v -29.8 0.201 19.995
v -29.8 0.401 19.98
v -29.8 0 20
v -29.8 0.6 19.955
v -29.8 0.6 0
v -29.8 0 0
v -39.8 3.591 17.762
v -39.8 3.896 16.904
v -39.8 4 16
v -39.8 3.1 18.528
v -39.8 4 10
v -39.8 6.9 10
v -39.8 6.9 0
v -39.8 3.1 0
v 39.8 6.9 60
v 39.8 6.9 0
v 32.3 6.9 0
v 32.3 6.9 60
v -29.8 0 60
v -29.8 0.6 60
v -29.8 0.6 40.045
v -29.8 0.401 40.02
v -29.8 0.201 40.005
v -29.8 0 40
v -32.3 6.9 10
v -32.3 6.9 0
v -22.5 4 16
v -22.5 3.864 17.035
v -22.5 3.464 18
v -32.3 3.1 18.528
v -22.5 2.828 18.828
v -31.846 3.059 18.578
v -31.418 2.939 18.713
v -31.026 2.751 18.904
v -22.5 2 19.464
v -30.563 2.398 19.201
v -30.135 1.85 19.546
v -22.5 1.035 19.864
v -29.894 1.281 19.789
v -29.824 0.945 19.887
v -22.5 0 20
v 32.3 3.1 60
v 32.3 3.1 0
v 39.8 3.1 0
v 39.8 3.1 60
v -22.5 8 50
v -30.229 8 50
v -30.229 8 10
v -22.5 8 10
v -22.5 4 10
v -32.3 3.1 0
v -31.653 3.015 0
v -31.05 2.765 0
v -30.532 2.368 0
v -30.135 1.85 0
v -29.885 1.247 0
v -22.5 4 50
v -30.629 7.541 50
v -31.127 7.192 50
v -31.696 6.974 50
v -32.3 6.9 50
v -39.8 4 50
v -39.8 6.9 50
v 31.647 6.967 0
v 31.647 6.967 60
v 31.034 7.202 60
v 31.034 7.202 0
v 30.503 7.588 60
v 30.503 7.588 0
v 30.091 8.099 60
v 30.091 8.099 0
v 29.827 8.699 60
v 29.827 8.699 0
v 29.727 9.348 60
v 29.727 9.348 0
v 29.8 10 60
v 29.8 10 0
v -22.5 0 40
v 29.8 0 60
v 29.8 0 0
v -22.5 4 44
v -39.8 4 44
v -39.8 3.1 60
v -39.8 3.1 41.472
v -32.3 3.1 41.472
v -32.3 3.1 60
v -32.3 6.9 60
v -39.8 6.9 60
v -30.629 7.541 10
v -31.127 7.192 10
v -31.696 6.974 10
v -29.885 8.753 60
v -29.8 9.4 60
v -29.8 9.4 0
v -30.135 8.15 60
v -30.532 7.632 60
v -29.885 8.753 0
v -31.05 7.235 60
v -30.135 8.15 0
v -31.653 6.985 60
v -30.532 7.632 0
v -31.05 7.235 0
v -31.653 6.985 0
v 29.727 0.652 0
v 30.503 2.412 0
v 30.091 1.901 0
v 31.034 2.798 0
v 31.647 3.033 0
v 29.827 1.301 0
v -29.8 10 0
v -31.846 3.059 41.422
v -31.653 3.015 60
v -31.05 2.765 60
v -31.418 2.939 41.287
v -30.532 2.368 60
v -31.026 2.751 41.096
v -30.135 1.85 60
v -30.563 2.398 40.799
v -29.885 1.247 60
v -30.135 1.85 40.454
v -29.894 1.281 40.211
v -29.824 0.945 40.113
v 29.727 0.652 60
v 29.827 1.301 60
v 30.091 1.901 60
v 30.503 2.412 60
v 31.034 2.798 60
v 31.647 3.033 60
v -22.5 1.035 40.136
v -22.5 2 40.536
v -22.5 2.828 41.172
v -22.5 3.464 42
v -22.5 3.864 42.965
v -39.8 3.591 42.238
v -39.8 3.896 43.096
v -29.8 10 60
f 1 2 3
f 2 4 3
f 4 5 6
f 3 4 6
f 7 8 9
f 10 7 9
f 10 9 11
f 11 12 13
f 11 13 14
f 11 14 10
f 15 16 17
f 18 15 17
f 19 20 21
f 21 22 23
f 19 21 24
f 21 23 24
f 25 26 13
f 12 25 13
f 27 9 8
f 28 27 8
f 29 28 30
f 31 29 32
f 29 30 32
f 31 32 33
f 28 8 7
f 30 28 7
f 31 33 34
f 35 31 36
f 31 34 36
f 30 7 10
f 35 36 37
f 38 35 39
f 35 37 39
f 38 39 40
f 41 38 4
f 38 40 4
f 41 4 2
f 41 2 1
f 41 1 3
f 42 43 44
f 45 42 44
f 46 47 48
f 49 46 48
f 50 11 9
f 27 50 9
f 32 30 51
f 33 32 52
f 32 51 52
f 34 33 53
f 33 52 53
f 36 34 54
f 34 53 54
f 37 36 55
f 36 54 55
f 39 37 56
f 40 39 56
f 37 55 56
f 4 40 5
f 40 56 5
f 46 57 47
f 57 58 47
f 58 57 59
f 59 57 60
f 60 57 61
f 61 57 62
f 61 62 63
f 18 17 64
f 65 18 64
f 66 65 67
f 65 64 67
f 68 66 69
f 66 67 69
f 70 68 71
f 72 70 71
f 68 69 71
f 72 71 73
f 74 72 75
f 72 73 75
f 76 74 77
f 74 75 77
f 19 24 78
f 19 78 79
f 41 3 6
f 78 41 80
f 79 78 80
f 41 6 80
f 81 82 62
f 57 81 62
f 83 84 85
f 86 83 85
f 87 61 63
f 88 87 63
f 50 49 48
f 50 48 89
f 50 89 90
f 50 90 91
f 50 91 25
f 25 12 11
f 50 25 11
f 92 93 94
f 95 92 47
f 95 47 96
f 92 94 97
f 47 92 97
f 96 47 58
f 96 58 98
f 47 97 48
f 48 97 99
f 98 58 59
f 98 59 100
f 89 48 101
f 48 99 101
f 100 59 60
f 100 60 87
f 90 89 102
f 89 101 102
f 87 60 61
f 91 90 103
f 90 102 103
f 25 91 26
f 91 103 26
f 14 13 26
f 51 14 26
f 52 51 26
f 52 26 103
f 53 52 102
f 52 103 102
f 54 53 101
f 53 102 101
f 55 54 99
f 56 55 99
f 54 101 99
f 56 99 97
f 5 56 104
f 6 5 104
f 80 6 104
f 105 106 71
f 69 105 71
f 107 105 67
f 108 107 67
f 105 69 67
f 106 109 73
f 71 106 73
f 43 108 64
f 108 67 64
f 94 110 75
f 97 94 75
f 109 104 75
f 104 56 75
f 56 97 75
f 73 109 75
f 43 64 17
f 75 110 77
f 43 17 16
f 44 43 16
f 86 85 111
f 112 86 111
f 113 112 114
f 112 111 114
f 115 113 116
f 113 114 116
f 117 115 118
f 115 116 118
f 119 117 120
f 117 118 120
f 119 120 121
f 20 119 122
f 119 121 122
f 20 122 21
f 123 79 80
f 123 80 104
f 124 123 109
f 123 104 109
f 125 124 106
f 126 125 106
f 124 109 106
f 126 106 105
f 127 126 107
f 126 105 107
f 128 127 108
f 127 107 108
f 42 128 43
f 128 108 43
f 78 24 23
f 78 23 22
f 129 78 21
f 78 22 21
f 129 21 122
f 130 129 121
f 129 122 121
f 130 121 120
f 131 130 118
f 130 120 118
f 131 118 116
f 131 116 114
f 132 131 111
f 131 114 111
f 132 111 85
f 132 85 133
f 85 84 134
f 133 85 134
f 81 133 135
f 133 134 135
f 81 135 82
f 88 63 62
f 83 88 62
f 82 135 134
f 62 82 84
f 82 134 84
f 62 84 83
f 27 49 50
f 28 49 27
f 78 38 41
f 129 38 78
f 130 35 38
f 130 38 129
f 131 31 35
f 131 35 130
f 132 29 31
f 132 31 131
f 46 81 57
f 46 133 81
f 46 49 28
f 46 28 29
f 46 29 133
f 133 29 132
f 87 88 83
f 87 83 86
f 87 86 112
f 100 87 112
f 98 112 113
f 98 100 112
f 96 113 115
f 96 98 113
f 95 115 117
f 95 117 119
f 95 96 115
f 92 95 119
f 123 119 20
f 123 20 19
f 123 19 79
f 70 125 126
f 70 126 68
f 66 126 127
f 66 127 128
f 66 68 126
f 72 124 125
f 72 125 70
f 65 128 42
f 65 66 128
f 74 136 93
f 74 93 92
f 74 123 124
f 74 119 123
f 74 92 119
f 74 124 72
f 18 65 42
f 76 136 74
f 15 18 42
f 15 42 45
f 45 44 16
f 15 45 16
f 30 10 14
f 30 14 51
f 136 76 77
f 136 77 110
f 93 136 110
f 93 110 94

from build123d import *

# Parameters (mm, degrees)
EXTRUDE_1_DEPTH     = 60
CUT_EXTRUDE_1_DEPTH = 17.3


with BuildPart() as part:
    # 스케치1 → 보스-돌출1 (new body)
    with BuildSketch(Plane.XY):
        with BuildLine():
            Line((29.8, 10), (-29.8, 10))
            Line((-29.8, 10), (-29.8, 9.4))
            ThreePointArc((-29.8, 9.4), (-30.532233047, 7.632233047), (-32.3, 6.9))
            Line((-32.3, 6.9), (-39.8, 6.9))
            Line((-39.8, 6.9), (-39.8, 3.1))
            Line((-39.8, 3.1), (-32.3, 3.1))
            ThreePointArc((-32.3, 3.1), (-30.532233047, 2.367766953), (-29.8, 0.6))
            Line((-29.8, 0.6), (-29.8, 0))
            Line((-29.8, 0), (29.8, 0))
            ThreePointArc((29.8, 0), (30.280633401, 2.170456935), (32.3, 3.1))
            Line((32.3, 3.1), (39.8, 3.1))
            Line((39.8, 3.1), (39.8, 6.9))
            Line((39.8, 6.9), (32.3, 6.9))
            ThreePointArc((32.3, 6.9), (30.280633401, 7.829543065), (29.8, 10))
        make_face()
    extrude(amount=EXTRUDE_1_DEPTH)

    # 스케치2 → 컷-돌출1 (cut)
    with BuildSketch(Plane.ZY.offset(39.8)):
        with BuildLine():
            Line((44, 4), (50, 4))
            Line((50, 4), (50, 8))
            Line((50, 8), (10, 8))
            Line((10, 8), (10, 4))
            Line((10, 4), (16, 4))
            ThreePointArc((16, 4), (18.828427125, 2.828427125), (20, 0))
            Line((20, 0), (40, 0))
            ThreePointArc((40, 0), (41.171572875, 2.828427125), (44, 4))
        make_face()
    extrude(amount=-CUT_EXTRUDE_1_DEPTH, mode=Mode.SUBTRACT)


solid = part.part
